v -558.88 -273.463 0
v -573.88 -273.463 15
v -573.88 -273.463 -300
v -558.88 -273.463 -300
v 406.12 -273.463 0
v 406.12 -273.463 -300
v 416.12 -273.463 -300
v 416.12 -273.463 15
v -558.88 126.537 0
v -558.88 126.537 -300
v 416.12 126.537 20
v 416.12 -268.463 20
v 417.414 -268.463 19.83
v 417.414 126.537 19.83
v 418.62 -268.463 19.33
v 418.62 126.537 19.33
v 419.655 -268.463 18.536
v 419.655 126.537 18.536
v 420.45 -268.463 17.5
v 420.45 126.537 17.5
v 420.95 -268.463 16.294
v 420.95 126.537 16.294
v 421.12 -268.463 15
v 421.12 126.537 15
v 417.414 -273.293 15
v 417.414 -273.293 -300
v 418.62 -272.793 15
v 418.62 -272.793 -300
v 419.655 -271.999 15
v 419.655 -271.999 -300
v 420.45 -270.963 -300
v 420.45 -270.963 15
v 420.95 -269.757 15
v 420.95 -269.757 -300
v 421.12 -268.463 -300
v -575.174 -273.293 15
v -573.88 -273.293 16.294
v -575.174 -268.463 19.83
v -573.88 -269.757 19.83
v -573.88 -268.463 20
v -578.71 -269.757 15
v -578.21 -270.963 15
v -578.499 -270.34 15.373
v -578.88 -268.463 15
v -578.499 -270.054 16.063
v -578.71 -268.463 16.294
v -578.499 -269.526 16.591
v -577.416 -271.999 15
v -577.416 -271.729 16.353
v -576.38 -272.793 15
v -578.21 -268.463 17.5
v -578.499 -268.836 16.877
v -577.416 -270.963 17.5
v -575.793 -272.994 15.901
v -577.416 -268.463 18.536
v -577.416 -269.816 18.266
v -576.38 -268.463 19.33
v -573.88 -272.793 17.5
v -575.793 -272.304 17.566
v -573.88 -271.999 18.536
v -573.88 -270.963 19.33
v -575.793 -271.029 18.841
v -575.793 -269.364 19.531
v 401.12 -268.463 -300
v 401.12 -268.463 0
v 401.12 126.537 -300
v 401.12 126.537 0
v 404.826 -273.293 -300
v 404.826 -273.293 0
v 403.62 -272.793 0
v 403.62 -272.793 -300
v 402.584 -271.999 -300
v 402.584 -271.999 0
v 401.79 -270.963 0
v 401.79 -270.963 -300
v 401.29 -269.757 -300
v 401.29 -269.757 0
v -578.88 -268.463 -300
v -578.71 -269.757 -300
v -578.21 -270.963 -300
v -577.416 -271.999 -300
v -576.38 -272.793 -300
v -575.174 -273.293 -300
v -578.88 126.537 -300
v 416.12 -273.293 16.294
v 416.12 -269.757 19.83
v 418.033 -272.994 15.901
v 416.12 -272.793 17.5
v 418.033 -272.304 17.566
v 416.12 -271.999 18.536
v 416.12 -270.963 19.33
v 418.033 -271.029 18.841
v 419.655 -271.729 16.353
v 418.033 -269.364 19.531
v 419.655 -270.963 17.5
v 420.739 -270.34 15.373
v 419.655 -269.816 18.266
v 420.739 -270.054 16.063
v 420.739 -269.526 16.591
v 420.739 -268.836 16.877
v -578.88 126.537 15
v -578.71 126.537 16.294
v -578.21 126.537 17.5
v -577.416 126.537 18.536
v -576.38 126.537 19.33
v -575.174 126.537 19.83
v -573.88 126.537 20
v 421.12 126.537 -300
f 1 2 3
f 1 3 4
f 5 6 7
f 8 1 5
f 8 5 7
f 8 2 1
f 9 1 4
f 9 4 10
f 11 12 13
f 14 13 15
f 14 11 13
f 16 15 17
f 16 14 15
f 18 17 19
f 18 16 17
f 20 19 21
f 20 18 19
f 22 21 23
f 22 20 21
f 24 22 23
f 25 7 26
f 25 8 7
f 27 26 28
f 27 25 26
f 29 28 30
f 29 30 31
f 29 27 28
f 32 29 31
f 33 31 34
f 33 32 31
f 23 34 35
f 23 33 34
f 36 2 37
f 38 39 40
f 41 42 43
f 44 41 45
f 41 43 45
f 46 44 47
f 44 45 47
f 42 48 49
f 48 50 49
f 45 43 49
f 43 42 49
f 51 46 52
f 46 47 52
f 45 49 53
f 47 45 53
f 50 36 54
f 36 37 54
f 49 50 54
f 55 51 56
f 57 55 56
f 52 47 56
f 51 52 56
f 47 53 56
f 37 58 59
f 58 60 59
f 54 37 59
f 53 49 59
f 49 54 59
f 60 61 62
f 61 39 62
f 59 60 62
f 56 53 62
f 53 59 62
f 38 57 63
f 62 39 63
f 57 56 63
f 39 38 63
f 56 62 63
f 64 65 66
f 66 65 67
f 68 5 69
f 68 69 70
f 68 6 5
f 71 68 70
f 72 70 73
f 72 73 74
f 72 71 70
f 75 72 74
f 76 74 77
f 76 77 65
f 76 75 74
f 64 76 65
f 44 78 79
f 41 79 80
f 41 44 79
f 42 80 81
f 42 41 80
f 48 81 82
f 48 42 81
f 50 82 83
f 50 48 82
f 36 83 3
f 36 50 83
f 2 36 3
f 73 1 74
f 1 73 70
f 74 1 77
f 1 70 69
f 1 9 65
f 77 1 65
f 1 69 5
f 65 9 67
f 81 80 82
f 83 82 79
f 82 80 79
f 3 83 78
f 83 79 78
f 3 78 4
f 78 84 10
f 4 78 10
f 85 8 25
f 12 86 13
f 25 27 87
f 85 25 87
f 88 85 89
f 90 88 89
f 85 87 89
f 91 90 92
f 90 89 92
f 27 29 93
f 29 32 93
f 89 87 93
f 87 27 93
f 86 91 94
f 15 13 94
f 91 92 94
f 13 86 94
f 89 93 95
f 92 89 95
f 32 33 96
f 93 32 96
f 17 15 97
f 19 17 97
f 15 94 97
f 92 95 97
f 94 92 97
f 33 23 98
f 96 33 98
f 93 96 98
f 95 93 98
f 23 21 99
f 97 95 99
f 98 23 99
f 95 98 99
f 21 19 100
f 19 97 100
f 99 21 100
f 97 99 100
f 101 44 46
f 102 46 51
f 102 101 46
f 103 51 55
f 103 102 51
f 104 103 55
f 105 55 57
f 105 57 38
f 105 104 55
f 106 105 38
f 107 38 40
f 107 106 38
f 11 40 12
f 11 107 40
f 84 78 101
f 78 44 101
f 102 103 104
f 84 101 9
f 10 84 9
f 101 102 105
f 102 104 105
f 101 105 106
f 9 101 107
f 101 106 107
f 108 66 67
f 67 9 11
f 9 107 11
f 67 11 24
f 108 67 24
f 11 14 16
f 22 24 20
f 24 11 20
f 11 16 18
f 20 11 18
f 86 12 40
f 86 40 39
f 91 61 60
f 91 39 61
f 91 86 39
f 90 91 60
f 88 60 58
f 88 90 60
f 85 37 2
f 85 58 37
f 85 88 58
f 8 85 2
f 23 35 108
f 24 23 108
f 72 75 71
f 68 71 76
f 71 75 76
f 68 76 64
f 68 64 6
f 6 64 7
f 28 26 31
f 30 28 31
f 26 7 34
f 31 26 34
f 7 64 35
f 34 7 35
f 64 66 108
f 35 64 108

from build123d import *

# Parameters (mm, degrees)
F0_W     = 1000
F0_H     = 400
F1_DEPTH = 20
F2_W     = 20
F2_H     = 400
F3_DEPTH = 300
F4_R     = 5
F5_R     = 5
F6_R     = 5


with BuildPart() as f1:
    # F0 (on Top) → F1 (new body)
    with BuildSketch(Plane.XY):
        with Locations((-78.8800735027, -73.4630868891)):
            Rectangle(F0_W, F0_H)
    extrude(amount=F1_DEPTH)

    # F2 (on face) → F3 (join)
    with BuildSketch(Plane.XY):
        with Locations((-568.8800735027, -73.4630868891)):
            Rectangle(F2_W, F2_H)
        with Locations((411.1199264973, -73.4630868891)):
            Rectangle(F2_W, F2_H)
    extrude(amount=-F3_DEPTH)

    # F4
    f4_edges = [f1.edges().sort_by_distance(p)[0] for p in [
        (-78.880074, -273.463087, 20),
    ]]
    fillet(f4_edges, radius=F4_R)

    # F5
    f5_edges = [f1.edges().sort_by_distance(p)[0] for p in [
        (421.119926, -70.963087, 20),
    ]]
    fillet(f5_edges, radius=F5_R)

    # F6
    f6_edges = [f1.edges().sort_by_distance(p)[0] for p in [
        (401.119926, -273.463087, -150),
        (-578.880074, -70.963087, 20),
    ]]
    fillet(f6_edges, radius=F6_R)


solid = f1.part
